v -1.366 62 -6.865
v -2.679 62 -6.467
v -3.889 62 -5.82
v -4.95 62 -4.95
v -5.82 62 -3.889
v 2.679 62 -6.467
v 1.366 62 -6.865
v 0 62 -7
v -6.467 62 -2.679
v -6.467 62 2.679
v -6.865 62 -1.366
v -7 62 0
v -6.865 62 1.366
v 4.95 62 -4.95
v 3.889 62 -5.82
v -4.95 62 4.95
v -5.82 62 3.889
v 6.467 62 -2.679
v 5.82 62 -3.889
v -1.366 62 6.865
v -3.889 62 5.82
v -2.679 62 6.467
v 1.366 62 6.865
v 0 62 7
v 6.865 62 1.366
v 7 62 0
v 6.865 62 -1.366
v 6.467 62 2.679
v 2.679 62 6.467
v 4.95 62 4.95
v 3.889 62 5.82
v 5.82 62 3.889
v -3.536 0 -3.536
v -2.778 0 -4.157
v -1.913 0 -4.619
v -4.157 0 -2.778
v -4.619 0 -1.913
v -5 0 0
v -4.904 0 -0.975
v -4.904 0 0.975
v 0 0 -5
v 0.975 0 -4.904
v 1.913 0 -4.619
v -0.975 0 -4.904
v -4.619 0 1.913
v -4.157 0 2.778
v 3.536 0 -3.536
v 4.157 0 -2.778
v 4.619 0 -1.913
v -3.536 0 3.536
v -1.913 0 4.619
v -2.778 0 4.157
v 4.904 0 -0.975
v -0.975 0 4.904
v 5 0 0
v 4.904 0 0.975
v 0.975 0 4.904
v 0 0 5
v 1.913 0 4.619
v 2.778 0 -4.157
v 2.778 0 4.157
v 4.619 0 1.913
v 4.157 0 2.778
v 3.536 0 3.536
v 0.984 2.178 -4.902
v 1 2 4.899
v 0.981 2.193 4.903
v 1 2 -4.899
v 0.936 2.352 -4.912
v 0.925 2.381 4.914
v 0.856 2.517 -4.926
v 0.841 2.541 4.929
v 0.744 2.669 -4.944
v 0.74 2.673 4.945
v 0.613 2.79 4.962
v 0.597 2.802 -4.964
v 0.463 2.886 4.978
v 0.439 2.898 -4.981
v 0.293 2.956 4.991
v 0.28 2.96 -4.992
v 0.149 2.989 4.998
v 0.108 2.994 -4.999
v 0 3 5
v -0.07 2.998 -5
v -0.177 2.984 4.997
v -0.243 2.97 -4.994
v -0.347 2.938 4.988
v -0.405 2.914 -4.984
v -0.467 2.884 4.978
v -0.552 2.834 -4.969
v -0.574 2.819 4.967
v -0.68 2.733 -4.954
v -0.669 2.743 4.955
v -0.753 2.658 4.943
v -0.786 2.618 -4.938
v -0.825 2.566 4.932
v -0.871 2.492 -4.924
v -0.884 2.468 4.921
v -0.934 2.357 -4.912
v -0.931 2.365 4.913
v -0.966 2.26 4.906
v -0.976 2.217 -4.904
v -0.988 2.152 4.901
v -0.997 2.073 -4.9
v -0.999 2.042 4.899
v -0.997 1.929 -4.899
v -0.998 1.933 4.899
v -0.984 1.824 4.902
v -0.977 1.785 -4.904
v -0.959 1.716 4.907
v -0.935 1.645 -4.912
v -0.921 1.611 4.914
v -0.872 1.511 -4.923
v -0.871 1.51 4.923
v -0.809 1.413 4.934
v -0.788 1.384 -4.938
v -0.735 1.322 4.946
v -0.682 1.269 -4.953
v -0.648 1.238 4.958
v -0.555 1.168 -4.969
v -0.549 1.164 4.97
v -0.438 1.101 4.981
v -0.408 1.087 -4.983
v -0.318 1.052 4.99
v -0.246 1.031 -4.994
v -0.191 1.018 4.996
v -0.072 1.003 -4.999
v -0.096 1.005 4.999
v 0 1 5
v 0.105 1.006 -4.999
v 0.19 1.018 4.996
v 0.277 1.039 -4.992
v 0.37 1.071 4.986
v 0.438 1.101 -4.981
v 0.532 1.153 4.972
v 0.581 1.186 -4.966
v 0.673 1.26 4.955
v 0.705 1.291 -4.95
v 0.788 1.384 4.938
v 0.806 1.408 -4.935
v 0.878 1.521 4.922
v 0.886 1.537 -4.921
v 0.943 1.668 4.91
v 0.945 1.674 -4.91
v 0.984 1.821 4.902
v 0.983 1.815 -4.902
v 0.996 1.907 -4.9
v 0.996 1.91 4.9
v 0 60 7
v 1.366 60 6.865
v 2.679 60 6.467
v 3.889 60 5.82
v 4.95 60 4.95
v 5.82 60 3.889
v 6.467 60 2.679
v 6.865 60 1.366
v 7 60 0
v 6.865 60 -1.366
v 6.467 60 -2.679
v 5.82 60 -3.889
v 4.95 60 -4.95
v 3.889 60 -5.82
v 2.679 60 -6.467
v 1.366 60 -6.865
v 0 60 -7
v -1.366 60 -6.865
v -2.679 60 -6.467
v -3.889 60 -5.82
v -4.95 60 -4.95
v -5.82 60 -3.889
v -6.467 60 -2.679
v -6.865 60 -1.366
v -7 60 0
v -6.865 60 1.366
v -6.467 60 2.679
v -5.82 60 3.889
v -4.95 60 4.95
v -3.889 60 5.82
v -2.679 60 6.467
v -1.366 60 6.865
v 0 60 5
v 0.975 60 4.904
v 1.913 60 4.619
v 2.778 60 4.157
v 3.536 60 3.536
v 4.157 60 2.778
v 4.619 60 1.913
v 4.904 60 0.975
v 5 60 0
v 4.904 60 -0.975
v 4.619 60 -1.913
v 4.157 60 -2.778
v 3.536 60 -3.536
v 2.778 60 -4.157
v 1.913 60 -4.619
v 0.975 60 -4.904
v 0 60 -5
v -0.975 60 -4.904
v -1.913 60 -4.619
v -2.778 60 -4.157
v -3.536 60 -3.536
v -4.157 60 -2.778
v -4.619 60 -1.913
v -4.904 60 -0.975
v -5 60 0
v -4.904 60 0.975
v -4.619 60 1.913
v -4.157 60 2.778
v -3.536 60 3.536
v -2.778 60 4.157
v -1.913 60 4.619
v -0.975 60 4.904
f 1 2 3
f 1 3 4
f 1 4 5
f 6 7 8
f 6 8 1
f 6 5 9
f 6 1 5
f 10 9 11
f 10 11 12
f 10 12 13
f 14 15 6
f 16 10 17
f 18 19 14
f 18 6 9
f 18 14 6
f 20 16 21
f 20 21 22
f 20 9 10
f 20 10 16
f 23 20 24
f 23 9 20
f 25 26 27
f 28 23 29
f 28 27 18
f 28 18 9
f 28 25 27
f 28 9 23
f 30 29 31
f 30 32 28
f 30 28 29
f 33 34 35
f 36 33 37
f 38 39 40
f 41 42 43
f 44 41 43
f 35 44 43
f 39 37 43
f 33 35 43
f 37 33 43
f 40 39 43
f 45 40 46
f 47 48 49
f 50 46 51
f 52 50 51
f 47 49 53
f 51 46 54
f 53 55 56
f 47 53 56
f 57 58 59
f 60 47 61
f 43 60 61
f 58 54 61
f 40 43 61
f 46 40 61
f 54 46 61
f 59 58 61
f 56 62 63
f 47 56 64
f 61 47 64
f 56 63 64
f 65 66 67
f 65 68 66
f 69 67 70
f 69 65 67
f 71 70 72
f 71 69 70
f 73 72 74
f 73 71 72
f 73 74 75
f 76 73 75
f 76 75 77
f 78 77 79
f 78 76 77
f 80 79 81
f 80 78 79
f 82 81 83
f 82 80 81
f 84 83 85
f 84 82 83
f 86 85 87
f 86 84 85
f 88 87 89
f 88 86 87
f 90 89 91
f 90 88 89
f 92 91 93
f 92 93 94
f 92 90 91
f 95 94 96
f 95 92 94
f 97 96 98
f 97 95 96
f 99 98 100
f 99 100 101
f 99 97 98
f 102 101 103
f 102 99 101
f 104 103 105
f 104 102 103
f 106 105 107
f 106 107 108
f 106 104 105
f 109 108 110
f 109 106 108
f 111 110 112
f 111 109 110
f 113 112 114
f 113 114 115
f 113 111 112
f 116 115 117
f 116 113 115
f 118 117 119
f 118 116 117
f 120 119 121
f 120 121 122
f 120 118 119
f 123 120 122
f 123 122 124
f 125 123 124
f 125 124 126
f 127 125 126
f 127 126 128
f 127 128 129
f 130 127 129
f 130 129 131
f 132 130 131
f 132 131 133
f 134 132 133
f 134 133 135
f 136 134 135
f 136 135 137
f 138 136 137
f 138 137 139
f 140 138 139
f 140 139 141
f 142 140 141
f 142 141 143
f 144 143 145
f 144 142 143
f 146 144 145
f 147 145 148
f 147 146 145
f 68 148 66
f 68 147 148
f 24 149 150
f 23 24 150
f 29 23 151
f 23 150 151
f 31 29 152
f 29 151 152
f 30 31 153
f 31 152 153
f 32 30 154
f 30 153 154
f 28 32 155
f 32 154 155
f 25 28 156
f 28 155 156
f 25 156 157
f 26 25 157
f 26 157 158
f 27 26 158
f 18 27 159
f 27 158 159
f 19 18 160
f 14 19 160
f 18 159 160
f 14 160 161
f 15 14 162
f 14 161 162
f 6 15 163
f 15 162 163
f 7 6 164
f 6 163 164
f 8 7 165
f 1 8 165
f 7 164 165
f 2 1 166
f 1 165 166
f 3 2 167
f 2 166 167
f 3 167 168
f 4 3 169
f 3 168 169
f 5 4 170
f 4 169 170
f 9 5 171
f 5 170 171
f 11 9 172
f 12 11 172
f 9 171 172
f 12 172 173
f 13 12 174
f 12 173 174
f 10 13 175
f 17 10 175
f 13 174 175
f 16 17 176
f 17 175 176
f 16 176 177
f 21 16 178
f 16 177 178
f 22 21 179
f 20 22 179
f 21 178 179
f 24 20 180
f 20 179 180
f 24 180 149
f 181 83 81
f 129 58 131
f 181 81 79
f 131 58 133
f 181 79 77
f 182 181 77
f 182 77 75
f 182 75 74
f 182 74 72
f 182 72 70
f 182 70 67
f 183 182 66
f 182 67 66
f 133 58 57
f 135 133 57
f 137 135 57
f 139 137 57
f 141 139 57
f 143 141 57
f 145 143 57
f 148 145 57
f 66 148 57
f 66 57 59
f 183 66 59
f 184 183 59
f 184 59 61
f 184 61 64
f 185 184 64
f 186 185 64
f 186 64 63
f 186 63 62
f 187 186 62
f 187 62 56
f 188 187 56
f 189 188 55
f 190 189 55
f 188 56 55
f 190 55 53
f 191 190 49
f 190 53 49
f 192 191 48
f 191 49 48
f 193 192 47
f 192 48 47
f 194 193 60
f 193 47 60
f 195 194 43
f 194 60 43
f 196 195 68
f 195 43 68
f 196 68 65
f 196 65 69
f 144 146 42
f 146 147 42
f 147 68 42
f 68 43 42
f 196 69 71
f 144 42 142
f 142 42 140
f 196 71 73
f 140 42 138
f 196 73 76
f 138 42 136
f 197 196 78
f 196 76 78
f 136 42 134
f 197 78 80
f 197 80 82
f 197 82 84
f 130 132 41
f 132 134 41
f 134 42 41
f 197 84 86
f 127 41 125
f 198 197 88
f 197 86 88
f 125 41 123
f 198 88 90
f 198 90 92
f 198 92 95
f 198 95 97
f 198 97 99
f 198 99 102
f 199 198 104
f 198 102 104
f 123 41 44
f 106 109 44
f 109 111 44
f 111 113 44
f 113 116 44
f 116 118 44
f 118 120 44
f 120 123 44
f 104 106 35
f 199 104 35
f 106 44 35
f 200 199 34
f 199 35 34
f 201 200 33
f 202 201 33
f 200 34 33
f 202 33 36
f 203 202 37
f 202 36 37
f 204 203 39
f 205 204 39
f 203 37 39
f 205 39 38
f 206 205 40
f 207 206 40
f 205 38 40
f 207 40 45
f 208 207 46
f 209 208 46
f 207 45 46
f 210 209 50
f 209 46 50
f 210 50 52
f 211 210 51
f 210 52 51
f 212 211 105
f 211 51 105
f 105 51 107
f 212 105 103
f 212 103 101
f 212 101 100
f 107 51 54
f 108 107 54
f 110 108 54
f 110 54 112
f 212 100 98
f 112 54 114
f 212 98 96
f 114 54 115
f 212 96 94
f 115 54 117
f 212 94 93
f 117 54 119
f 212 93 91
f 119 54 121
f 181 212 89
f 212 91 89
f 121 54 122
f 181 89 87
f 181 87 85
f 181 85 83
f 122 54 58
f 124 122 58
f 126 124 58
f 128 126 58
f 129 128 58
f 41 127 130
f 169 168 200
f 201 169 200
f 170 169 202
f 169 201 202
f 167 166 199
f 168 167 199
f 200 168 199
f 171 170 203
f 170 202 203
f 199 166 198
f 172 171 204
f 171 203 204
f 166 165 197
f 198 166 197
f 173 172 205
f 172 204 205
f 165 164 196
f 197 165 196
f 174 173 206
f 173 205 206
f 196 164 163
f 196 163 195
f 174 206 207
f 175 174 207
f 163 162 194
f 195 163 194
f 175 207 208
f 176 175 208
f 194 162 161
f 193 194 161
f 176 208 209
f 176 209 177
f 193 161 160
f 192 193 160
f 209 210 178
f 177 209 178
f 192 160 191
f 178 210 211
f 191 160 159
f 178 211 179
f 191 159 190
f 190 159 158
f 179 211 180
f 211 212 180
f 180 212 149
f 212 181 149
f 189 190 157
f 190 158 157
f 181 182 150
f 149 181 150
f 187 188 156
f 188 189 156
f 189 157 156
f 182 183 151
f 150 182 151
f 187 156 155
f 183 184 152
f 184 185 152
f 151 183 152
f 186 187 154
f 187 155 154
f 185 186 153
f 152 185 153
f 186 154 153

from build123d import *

# Parameters (mm, degrees)
CROQUIS2_R                             = 5
SALIENTE_EXTRUIR1_DEPTH                = 60
CROQUIS3_R                             = 7
SALIENTE_EXTRUIR2_DEPTH                = 2
CORTAR_EXTRUIR1_REACH                  = 64.785
CORTAR_EXTRUIR1_END_RADIUS             = 5
CROQUIS4_R                             = 1
CORTAR_EXTRUIR1_DIRECTION_2_REACH      = 64.785
CORTAR_EXTRUIR1_DIRECTION_2_END_RADIUS = 5


with BuildPart() as part:
    # Croquis2 → Saliente-Extruir1 (new body)
    with BuildSketch(Plane(origin=(0, 0, 0), x_dir=(1, 0, 0), z_dir=(0, 1, 0))):
        with Locations(Location((0, 0, 0), (0, 0, 270))):
            Circle(CROQUIS2_R)
    extrude(amount=SALIENTE_EXTRUIR1_DEPTH)

    # Croquis3 → Saliente-Extruir2 (add)
    with BuildSketch(Plane(origin=(0, 60, 0), x_dir=(1, 0, 0), z_dir=(0, 1, 0))):
        with Locations(Location((0, 0, 0), (0, 0, 270))):
            Circle(CROQUIS3_R)
    extrude(amount=SALIENTE_EXTRUIR2_DEPTH)

    # Cortar-Extruir1: up to this cylinder (the profile starts inside it)
    cortar_extruir1_end = Plane(origin=(0, 2, 0), z_dir=(0, -1, 0)) * Cylinder(CORTAR_EXTRUIR1_END_RADIUS, 140.57, mode=Mode.PRIVATE)
    # Croquis4 → Cortar-Extruir1 (cut, up to the surface)
    with BuildSketch(Plane.XY, mode=Mode.PRIVATE) as cortar_extruir1_sk1:
        with Locations((0, 2)):
            Circle(CROQUIS4_R)
    cortar_extruir1_tool1 = extrude(cortar_extruir1_sk1.sketch, amount=-CORTAR_EXTRUIR1_REACH, mode=Mode.PRIVATE) & cortar_extruir1_end
    add(cortar_extruir1_tool1.solids().sort_by_distance((0, 2, 0))[0], mode=Mode.SUBTRACT)

    # Cortar-Extruir1 direction 2: up to this cylinder (the profile starts inside it)
    cortar_extruir1_direction_2_end = Plane(origin=(0, 2, 0), z_dir=(0, -1, 0)) * Cylinder(CORTAR_EXTRUIR1_DIRECTION_2_END_RADIUS, 140.57, mode=Mode.PRIVATE)
    # Croquis4 → Cortar-Extruir1 direction 2 (cut, up to the surface)
    with BuildSketch(Plane.XY, mode=Mode.PRIVATE) as cortar_extruir1_direction_2_sk1:
        with Locations((0, 2)):
            Circle(CROQUIS4_R)
    cortar_extruir1_direction_2_tool1 = extrude(cortar_extruir1_direction_2_sk1.sketch, amount=CORTAR_EXTRUIR1_DIRECTION_2_REACH, mode=Mode.PRIVATE) & cortar_extruir1_direction_2_end
    add(cortar_extruir1_direction_2_tool1.solids().sort_by_distance((0, 2, 0))[0], mode=Mode.SUBTRACT)


solid = part.part
